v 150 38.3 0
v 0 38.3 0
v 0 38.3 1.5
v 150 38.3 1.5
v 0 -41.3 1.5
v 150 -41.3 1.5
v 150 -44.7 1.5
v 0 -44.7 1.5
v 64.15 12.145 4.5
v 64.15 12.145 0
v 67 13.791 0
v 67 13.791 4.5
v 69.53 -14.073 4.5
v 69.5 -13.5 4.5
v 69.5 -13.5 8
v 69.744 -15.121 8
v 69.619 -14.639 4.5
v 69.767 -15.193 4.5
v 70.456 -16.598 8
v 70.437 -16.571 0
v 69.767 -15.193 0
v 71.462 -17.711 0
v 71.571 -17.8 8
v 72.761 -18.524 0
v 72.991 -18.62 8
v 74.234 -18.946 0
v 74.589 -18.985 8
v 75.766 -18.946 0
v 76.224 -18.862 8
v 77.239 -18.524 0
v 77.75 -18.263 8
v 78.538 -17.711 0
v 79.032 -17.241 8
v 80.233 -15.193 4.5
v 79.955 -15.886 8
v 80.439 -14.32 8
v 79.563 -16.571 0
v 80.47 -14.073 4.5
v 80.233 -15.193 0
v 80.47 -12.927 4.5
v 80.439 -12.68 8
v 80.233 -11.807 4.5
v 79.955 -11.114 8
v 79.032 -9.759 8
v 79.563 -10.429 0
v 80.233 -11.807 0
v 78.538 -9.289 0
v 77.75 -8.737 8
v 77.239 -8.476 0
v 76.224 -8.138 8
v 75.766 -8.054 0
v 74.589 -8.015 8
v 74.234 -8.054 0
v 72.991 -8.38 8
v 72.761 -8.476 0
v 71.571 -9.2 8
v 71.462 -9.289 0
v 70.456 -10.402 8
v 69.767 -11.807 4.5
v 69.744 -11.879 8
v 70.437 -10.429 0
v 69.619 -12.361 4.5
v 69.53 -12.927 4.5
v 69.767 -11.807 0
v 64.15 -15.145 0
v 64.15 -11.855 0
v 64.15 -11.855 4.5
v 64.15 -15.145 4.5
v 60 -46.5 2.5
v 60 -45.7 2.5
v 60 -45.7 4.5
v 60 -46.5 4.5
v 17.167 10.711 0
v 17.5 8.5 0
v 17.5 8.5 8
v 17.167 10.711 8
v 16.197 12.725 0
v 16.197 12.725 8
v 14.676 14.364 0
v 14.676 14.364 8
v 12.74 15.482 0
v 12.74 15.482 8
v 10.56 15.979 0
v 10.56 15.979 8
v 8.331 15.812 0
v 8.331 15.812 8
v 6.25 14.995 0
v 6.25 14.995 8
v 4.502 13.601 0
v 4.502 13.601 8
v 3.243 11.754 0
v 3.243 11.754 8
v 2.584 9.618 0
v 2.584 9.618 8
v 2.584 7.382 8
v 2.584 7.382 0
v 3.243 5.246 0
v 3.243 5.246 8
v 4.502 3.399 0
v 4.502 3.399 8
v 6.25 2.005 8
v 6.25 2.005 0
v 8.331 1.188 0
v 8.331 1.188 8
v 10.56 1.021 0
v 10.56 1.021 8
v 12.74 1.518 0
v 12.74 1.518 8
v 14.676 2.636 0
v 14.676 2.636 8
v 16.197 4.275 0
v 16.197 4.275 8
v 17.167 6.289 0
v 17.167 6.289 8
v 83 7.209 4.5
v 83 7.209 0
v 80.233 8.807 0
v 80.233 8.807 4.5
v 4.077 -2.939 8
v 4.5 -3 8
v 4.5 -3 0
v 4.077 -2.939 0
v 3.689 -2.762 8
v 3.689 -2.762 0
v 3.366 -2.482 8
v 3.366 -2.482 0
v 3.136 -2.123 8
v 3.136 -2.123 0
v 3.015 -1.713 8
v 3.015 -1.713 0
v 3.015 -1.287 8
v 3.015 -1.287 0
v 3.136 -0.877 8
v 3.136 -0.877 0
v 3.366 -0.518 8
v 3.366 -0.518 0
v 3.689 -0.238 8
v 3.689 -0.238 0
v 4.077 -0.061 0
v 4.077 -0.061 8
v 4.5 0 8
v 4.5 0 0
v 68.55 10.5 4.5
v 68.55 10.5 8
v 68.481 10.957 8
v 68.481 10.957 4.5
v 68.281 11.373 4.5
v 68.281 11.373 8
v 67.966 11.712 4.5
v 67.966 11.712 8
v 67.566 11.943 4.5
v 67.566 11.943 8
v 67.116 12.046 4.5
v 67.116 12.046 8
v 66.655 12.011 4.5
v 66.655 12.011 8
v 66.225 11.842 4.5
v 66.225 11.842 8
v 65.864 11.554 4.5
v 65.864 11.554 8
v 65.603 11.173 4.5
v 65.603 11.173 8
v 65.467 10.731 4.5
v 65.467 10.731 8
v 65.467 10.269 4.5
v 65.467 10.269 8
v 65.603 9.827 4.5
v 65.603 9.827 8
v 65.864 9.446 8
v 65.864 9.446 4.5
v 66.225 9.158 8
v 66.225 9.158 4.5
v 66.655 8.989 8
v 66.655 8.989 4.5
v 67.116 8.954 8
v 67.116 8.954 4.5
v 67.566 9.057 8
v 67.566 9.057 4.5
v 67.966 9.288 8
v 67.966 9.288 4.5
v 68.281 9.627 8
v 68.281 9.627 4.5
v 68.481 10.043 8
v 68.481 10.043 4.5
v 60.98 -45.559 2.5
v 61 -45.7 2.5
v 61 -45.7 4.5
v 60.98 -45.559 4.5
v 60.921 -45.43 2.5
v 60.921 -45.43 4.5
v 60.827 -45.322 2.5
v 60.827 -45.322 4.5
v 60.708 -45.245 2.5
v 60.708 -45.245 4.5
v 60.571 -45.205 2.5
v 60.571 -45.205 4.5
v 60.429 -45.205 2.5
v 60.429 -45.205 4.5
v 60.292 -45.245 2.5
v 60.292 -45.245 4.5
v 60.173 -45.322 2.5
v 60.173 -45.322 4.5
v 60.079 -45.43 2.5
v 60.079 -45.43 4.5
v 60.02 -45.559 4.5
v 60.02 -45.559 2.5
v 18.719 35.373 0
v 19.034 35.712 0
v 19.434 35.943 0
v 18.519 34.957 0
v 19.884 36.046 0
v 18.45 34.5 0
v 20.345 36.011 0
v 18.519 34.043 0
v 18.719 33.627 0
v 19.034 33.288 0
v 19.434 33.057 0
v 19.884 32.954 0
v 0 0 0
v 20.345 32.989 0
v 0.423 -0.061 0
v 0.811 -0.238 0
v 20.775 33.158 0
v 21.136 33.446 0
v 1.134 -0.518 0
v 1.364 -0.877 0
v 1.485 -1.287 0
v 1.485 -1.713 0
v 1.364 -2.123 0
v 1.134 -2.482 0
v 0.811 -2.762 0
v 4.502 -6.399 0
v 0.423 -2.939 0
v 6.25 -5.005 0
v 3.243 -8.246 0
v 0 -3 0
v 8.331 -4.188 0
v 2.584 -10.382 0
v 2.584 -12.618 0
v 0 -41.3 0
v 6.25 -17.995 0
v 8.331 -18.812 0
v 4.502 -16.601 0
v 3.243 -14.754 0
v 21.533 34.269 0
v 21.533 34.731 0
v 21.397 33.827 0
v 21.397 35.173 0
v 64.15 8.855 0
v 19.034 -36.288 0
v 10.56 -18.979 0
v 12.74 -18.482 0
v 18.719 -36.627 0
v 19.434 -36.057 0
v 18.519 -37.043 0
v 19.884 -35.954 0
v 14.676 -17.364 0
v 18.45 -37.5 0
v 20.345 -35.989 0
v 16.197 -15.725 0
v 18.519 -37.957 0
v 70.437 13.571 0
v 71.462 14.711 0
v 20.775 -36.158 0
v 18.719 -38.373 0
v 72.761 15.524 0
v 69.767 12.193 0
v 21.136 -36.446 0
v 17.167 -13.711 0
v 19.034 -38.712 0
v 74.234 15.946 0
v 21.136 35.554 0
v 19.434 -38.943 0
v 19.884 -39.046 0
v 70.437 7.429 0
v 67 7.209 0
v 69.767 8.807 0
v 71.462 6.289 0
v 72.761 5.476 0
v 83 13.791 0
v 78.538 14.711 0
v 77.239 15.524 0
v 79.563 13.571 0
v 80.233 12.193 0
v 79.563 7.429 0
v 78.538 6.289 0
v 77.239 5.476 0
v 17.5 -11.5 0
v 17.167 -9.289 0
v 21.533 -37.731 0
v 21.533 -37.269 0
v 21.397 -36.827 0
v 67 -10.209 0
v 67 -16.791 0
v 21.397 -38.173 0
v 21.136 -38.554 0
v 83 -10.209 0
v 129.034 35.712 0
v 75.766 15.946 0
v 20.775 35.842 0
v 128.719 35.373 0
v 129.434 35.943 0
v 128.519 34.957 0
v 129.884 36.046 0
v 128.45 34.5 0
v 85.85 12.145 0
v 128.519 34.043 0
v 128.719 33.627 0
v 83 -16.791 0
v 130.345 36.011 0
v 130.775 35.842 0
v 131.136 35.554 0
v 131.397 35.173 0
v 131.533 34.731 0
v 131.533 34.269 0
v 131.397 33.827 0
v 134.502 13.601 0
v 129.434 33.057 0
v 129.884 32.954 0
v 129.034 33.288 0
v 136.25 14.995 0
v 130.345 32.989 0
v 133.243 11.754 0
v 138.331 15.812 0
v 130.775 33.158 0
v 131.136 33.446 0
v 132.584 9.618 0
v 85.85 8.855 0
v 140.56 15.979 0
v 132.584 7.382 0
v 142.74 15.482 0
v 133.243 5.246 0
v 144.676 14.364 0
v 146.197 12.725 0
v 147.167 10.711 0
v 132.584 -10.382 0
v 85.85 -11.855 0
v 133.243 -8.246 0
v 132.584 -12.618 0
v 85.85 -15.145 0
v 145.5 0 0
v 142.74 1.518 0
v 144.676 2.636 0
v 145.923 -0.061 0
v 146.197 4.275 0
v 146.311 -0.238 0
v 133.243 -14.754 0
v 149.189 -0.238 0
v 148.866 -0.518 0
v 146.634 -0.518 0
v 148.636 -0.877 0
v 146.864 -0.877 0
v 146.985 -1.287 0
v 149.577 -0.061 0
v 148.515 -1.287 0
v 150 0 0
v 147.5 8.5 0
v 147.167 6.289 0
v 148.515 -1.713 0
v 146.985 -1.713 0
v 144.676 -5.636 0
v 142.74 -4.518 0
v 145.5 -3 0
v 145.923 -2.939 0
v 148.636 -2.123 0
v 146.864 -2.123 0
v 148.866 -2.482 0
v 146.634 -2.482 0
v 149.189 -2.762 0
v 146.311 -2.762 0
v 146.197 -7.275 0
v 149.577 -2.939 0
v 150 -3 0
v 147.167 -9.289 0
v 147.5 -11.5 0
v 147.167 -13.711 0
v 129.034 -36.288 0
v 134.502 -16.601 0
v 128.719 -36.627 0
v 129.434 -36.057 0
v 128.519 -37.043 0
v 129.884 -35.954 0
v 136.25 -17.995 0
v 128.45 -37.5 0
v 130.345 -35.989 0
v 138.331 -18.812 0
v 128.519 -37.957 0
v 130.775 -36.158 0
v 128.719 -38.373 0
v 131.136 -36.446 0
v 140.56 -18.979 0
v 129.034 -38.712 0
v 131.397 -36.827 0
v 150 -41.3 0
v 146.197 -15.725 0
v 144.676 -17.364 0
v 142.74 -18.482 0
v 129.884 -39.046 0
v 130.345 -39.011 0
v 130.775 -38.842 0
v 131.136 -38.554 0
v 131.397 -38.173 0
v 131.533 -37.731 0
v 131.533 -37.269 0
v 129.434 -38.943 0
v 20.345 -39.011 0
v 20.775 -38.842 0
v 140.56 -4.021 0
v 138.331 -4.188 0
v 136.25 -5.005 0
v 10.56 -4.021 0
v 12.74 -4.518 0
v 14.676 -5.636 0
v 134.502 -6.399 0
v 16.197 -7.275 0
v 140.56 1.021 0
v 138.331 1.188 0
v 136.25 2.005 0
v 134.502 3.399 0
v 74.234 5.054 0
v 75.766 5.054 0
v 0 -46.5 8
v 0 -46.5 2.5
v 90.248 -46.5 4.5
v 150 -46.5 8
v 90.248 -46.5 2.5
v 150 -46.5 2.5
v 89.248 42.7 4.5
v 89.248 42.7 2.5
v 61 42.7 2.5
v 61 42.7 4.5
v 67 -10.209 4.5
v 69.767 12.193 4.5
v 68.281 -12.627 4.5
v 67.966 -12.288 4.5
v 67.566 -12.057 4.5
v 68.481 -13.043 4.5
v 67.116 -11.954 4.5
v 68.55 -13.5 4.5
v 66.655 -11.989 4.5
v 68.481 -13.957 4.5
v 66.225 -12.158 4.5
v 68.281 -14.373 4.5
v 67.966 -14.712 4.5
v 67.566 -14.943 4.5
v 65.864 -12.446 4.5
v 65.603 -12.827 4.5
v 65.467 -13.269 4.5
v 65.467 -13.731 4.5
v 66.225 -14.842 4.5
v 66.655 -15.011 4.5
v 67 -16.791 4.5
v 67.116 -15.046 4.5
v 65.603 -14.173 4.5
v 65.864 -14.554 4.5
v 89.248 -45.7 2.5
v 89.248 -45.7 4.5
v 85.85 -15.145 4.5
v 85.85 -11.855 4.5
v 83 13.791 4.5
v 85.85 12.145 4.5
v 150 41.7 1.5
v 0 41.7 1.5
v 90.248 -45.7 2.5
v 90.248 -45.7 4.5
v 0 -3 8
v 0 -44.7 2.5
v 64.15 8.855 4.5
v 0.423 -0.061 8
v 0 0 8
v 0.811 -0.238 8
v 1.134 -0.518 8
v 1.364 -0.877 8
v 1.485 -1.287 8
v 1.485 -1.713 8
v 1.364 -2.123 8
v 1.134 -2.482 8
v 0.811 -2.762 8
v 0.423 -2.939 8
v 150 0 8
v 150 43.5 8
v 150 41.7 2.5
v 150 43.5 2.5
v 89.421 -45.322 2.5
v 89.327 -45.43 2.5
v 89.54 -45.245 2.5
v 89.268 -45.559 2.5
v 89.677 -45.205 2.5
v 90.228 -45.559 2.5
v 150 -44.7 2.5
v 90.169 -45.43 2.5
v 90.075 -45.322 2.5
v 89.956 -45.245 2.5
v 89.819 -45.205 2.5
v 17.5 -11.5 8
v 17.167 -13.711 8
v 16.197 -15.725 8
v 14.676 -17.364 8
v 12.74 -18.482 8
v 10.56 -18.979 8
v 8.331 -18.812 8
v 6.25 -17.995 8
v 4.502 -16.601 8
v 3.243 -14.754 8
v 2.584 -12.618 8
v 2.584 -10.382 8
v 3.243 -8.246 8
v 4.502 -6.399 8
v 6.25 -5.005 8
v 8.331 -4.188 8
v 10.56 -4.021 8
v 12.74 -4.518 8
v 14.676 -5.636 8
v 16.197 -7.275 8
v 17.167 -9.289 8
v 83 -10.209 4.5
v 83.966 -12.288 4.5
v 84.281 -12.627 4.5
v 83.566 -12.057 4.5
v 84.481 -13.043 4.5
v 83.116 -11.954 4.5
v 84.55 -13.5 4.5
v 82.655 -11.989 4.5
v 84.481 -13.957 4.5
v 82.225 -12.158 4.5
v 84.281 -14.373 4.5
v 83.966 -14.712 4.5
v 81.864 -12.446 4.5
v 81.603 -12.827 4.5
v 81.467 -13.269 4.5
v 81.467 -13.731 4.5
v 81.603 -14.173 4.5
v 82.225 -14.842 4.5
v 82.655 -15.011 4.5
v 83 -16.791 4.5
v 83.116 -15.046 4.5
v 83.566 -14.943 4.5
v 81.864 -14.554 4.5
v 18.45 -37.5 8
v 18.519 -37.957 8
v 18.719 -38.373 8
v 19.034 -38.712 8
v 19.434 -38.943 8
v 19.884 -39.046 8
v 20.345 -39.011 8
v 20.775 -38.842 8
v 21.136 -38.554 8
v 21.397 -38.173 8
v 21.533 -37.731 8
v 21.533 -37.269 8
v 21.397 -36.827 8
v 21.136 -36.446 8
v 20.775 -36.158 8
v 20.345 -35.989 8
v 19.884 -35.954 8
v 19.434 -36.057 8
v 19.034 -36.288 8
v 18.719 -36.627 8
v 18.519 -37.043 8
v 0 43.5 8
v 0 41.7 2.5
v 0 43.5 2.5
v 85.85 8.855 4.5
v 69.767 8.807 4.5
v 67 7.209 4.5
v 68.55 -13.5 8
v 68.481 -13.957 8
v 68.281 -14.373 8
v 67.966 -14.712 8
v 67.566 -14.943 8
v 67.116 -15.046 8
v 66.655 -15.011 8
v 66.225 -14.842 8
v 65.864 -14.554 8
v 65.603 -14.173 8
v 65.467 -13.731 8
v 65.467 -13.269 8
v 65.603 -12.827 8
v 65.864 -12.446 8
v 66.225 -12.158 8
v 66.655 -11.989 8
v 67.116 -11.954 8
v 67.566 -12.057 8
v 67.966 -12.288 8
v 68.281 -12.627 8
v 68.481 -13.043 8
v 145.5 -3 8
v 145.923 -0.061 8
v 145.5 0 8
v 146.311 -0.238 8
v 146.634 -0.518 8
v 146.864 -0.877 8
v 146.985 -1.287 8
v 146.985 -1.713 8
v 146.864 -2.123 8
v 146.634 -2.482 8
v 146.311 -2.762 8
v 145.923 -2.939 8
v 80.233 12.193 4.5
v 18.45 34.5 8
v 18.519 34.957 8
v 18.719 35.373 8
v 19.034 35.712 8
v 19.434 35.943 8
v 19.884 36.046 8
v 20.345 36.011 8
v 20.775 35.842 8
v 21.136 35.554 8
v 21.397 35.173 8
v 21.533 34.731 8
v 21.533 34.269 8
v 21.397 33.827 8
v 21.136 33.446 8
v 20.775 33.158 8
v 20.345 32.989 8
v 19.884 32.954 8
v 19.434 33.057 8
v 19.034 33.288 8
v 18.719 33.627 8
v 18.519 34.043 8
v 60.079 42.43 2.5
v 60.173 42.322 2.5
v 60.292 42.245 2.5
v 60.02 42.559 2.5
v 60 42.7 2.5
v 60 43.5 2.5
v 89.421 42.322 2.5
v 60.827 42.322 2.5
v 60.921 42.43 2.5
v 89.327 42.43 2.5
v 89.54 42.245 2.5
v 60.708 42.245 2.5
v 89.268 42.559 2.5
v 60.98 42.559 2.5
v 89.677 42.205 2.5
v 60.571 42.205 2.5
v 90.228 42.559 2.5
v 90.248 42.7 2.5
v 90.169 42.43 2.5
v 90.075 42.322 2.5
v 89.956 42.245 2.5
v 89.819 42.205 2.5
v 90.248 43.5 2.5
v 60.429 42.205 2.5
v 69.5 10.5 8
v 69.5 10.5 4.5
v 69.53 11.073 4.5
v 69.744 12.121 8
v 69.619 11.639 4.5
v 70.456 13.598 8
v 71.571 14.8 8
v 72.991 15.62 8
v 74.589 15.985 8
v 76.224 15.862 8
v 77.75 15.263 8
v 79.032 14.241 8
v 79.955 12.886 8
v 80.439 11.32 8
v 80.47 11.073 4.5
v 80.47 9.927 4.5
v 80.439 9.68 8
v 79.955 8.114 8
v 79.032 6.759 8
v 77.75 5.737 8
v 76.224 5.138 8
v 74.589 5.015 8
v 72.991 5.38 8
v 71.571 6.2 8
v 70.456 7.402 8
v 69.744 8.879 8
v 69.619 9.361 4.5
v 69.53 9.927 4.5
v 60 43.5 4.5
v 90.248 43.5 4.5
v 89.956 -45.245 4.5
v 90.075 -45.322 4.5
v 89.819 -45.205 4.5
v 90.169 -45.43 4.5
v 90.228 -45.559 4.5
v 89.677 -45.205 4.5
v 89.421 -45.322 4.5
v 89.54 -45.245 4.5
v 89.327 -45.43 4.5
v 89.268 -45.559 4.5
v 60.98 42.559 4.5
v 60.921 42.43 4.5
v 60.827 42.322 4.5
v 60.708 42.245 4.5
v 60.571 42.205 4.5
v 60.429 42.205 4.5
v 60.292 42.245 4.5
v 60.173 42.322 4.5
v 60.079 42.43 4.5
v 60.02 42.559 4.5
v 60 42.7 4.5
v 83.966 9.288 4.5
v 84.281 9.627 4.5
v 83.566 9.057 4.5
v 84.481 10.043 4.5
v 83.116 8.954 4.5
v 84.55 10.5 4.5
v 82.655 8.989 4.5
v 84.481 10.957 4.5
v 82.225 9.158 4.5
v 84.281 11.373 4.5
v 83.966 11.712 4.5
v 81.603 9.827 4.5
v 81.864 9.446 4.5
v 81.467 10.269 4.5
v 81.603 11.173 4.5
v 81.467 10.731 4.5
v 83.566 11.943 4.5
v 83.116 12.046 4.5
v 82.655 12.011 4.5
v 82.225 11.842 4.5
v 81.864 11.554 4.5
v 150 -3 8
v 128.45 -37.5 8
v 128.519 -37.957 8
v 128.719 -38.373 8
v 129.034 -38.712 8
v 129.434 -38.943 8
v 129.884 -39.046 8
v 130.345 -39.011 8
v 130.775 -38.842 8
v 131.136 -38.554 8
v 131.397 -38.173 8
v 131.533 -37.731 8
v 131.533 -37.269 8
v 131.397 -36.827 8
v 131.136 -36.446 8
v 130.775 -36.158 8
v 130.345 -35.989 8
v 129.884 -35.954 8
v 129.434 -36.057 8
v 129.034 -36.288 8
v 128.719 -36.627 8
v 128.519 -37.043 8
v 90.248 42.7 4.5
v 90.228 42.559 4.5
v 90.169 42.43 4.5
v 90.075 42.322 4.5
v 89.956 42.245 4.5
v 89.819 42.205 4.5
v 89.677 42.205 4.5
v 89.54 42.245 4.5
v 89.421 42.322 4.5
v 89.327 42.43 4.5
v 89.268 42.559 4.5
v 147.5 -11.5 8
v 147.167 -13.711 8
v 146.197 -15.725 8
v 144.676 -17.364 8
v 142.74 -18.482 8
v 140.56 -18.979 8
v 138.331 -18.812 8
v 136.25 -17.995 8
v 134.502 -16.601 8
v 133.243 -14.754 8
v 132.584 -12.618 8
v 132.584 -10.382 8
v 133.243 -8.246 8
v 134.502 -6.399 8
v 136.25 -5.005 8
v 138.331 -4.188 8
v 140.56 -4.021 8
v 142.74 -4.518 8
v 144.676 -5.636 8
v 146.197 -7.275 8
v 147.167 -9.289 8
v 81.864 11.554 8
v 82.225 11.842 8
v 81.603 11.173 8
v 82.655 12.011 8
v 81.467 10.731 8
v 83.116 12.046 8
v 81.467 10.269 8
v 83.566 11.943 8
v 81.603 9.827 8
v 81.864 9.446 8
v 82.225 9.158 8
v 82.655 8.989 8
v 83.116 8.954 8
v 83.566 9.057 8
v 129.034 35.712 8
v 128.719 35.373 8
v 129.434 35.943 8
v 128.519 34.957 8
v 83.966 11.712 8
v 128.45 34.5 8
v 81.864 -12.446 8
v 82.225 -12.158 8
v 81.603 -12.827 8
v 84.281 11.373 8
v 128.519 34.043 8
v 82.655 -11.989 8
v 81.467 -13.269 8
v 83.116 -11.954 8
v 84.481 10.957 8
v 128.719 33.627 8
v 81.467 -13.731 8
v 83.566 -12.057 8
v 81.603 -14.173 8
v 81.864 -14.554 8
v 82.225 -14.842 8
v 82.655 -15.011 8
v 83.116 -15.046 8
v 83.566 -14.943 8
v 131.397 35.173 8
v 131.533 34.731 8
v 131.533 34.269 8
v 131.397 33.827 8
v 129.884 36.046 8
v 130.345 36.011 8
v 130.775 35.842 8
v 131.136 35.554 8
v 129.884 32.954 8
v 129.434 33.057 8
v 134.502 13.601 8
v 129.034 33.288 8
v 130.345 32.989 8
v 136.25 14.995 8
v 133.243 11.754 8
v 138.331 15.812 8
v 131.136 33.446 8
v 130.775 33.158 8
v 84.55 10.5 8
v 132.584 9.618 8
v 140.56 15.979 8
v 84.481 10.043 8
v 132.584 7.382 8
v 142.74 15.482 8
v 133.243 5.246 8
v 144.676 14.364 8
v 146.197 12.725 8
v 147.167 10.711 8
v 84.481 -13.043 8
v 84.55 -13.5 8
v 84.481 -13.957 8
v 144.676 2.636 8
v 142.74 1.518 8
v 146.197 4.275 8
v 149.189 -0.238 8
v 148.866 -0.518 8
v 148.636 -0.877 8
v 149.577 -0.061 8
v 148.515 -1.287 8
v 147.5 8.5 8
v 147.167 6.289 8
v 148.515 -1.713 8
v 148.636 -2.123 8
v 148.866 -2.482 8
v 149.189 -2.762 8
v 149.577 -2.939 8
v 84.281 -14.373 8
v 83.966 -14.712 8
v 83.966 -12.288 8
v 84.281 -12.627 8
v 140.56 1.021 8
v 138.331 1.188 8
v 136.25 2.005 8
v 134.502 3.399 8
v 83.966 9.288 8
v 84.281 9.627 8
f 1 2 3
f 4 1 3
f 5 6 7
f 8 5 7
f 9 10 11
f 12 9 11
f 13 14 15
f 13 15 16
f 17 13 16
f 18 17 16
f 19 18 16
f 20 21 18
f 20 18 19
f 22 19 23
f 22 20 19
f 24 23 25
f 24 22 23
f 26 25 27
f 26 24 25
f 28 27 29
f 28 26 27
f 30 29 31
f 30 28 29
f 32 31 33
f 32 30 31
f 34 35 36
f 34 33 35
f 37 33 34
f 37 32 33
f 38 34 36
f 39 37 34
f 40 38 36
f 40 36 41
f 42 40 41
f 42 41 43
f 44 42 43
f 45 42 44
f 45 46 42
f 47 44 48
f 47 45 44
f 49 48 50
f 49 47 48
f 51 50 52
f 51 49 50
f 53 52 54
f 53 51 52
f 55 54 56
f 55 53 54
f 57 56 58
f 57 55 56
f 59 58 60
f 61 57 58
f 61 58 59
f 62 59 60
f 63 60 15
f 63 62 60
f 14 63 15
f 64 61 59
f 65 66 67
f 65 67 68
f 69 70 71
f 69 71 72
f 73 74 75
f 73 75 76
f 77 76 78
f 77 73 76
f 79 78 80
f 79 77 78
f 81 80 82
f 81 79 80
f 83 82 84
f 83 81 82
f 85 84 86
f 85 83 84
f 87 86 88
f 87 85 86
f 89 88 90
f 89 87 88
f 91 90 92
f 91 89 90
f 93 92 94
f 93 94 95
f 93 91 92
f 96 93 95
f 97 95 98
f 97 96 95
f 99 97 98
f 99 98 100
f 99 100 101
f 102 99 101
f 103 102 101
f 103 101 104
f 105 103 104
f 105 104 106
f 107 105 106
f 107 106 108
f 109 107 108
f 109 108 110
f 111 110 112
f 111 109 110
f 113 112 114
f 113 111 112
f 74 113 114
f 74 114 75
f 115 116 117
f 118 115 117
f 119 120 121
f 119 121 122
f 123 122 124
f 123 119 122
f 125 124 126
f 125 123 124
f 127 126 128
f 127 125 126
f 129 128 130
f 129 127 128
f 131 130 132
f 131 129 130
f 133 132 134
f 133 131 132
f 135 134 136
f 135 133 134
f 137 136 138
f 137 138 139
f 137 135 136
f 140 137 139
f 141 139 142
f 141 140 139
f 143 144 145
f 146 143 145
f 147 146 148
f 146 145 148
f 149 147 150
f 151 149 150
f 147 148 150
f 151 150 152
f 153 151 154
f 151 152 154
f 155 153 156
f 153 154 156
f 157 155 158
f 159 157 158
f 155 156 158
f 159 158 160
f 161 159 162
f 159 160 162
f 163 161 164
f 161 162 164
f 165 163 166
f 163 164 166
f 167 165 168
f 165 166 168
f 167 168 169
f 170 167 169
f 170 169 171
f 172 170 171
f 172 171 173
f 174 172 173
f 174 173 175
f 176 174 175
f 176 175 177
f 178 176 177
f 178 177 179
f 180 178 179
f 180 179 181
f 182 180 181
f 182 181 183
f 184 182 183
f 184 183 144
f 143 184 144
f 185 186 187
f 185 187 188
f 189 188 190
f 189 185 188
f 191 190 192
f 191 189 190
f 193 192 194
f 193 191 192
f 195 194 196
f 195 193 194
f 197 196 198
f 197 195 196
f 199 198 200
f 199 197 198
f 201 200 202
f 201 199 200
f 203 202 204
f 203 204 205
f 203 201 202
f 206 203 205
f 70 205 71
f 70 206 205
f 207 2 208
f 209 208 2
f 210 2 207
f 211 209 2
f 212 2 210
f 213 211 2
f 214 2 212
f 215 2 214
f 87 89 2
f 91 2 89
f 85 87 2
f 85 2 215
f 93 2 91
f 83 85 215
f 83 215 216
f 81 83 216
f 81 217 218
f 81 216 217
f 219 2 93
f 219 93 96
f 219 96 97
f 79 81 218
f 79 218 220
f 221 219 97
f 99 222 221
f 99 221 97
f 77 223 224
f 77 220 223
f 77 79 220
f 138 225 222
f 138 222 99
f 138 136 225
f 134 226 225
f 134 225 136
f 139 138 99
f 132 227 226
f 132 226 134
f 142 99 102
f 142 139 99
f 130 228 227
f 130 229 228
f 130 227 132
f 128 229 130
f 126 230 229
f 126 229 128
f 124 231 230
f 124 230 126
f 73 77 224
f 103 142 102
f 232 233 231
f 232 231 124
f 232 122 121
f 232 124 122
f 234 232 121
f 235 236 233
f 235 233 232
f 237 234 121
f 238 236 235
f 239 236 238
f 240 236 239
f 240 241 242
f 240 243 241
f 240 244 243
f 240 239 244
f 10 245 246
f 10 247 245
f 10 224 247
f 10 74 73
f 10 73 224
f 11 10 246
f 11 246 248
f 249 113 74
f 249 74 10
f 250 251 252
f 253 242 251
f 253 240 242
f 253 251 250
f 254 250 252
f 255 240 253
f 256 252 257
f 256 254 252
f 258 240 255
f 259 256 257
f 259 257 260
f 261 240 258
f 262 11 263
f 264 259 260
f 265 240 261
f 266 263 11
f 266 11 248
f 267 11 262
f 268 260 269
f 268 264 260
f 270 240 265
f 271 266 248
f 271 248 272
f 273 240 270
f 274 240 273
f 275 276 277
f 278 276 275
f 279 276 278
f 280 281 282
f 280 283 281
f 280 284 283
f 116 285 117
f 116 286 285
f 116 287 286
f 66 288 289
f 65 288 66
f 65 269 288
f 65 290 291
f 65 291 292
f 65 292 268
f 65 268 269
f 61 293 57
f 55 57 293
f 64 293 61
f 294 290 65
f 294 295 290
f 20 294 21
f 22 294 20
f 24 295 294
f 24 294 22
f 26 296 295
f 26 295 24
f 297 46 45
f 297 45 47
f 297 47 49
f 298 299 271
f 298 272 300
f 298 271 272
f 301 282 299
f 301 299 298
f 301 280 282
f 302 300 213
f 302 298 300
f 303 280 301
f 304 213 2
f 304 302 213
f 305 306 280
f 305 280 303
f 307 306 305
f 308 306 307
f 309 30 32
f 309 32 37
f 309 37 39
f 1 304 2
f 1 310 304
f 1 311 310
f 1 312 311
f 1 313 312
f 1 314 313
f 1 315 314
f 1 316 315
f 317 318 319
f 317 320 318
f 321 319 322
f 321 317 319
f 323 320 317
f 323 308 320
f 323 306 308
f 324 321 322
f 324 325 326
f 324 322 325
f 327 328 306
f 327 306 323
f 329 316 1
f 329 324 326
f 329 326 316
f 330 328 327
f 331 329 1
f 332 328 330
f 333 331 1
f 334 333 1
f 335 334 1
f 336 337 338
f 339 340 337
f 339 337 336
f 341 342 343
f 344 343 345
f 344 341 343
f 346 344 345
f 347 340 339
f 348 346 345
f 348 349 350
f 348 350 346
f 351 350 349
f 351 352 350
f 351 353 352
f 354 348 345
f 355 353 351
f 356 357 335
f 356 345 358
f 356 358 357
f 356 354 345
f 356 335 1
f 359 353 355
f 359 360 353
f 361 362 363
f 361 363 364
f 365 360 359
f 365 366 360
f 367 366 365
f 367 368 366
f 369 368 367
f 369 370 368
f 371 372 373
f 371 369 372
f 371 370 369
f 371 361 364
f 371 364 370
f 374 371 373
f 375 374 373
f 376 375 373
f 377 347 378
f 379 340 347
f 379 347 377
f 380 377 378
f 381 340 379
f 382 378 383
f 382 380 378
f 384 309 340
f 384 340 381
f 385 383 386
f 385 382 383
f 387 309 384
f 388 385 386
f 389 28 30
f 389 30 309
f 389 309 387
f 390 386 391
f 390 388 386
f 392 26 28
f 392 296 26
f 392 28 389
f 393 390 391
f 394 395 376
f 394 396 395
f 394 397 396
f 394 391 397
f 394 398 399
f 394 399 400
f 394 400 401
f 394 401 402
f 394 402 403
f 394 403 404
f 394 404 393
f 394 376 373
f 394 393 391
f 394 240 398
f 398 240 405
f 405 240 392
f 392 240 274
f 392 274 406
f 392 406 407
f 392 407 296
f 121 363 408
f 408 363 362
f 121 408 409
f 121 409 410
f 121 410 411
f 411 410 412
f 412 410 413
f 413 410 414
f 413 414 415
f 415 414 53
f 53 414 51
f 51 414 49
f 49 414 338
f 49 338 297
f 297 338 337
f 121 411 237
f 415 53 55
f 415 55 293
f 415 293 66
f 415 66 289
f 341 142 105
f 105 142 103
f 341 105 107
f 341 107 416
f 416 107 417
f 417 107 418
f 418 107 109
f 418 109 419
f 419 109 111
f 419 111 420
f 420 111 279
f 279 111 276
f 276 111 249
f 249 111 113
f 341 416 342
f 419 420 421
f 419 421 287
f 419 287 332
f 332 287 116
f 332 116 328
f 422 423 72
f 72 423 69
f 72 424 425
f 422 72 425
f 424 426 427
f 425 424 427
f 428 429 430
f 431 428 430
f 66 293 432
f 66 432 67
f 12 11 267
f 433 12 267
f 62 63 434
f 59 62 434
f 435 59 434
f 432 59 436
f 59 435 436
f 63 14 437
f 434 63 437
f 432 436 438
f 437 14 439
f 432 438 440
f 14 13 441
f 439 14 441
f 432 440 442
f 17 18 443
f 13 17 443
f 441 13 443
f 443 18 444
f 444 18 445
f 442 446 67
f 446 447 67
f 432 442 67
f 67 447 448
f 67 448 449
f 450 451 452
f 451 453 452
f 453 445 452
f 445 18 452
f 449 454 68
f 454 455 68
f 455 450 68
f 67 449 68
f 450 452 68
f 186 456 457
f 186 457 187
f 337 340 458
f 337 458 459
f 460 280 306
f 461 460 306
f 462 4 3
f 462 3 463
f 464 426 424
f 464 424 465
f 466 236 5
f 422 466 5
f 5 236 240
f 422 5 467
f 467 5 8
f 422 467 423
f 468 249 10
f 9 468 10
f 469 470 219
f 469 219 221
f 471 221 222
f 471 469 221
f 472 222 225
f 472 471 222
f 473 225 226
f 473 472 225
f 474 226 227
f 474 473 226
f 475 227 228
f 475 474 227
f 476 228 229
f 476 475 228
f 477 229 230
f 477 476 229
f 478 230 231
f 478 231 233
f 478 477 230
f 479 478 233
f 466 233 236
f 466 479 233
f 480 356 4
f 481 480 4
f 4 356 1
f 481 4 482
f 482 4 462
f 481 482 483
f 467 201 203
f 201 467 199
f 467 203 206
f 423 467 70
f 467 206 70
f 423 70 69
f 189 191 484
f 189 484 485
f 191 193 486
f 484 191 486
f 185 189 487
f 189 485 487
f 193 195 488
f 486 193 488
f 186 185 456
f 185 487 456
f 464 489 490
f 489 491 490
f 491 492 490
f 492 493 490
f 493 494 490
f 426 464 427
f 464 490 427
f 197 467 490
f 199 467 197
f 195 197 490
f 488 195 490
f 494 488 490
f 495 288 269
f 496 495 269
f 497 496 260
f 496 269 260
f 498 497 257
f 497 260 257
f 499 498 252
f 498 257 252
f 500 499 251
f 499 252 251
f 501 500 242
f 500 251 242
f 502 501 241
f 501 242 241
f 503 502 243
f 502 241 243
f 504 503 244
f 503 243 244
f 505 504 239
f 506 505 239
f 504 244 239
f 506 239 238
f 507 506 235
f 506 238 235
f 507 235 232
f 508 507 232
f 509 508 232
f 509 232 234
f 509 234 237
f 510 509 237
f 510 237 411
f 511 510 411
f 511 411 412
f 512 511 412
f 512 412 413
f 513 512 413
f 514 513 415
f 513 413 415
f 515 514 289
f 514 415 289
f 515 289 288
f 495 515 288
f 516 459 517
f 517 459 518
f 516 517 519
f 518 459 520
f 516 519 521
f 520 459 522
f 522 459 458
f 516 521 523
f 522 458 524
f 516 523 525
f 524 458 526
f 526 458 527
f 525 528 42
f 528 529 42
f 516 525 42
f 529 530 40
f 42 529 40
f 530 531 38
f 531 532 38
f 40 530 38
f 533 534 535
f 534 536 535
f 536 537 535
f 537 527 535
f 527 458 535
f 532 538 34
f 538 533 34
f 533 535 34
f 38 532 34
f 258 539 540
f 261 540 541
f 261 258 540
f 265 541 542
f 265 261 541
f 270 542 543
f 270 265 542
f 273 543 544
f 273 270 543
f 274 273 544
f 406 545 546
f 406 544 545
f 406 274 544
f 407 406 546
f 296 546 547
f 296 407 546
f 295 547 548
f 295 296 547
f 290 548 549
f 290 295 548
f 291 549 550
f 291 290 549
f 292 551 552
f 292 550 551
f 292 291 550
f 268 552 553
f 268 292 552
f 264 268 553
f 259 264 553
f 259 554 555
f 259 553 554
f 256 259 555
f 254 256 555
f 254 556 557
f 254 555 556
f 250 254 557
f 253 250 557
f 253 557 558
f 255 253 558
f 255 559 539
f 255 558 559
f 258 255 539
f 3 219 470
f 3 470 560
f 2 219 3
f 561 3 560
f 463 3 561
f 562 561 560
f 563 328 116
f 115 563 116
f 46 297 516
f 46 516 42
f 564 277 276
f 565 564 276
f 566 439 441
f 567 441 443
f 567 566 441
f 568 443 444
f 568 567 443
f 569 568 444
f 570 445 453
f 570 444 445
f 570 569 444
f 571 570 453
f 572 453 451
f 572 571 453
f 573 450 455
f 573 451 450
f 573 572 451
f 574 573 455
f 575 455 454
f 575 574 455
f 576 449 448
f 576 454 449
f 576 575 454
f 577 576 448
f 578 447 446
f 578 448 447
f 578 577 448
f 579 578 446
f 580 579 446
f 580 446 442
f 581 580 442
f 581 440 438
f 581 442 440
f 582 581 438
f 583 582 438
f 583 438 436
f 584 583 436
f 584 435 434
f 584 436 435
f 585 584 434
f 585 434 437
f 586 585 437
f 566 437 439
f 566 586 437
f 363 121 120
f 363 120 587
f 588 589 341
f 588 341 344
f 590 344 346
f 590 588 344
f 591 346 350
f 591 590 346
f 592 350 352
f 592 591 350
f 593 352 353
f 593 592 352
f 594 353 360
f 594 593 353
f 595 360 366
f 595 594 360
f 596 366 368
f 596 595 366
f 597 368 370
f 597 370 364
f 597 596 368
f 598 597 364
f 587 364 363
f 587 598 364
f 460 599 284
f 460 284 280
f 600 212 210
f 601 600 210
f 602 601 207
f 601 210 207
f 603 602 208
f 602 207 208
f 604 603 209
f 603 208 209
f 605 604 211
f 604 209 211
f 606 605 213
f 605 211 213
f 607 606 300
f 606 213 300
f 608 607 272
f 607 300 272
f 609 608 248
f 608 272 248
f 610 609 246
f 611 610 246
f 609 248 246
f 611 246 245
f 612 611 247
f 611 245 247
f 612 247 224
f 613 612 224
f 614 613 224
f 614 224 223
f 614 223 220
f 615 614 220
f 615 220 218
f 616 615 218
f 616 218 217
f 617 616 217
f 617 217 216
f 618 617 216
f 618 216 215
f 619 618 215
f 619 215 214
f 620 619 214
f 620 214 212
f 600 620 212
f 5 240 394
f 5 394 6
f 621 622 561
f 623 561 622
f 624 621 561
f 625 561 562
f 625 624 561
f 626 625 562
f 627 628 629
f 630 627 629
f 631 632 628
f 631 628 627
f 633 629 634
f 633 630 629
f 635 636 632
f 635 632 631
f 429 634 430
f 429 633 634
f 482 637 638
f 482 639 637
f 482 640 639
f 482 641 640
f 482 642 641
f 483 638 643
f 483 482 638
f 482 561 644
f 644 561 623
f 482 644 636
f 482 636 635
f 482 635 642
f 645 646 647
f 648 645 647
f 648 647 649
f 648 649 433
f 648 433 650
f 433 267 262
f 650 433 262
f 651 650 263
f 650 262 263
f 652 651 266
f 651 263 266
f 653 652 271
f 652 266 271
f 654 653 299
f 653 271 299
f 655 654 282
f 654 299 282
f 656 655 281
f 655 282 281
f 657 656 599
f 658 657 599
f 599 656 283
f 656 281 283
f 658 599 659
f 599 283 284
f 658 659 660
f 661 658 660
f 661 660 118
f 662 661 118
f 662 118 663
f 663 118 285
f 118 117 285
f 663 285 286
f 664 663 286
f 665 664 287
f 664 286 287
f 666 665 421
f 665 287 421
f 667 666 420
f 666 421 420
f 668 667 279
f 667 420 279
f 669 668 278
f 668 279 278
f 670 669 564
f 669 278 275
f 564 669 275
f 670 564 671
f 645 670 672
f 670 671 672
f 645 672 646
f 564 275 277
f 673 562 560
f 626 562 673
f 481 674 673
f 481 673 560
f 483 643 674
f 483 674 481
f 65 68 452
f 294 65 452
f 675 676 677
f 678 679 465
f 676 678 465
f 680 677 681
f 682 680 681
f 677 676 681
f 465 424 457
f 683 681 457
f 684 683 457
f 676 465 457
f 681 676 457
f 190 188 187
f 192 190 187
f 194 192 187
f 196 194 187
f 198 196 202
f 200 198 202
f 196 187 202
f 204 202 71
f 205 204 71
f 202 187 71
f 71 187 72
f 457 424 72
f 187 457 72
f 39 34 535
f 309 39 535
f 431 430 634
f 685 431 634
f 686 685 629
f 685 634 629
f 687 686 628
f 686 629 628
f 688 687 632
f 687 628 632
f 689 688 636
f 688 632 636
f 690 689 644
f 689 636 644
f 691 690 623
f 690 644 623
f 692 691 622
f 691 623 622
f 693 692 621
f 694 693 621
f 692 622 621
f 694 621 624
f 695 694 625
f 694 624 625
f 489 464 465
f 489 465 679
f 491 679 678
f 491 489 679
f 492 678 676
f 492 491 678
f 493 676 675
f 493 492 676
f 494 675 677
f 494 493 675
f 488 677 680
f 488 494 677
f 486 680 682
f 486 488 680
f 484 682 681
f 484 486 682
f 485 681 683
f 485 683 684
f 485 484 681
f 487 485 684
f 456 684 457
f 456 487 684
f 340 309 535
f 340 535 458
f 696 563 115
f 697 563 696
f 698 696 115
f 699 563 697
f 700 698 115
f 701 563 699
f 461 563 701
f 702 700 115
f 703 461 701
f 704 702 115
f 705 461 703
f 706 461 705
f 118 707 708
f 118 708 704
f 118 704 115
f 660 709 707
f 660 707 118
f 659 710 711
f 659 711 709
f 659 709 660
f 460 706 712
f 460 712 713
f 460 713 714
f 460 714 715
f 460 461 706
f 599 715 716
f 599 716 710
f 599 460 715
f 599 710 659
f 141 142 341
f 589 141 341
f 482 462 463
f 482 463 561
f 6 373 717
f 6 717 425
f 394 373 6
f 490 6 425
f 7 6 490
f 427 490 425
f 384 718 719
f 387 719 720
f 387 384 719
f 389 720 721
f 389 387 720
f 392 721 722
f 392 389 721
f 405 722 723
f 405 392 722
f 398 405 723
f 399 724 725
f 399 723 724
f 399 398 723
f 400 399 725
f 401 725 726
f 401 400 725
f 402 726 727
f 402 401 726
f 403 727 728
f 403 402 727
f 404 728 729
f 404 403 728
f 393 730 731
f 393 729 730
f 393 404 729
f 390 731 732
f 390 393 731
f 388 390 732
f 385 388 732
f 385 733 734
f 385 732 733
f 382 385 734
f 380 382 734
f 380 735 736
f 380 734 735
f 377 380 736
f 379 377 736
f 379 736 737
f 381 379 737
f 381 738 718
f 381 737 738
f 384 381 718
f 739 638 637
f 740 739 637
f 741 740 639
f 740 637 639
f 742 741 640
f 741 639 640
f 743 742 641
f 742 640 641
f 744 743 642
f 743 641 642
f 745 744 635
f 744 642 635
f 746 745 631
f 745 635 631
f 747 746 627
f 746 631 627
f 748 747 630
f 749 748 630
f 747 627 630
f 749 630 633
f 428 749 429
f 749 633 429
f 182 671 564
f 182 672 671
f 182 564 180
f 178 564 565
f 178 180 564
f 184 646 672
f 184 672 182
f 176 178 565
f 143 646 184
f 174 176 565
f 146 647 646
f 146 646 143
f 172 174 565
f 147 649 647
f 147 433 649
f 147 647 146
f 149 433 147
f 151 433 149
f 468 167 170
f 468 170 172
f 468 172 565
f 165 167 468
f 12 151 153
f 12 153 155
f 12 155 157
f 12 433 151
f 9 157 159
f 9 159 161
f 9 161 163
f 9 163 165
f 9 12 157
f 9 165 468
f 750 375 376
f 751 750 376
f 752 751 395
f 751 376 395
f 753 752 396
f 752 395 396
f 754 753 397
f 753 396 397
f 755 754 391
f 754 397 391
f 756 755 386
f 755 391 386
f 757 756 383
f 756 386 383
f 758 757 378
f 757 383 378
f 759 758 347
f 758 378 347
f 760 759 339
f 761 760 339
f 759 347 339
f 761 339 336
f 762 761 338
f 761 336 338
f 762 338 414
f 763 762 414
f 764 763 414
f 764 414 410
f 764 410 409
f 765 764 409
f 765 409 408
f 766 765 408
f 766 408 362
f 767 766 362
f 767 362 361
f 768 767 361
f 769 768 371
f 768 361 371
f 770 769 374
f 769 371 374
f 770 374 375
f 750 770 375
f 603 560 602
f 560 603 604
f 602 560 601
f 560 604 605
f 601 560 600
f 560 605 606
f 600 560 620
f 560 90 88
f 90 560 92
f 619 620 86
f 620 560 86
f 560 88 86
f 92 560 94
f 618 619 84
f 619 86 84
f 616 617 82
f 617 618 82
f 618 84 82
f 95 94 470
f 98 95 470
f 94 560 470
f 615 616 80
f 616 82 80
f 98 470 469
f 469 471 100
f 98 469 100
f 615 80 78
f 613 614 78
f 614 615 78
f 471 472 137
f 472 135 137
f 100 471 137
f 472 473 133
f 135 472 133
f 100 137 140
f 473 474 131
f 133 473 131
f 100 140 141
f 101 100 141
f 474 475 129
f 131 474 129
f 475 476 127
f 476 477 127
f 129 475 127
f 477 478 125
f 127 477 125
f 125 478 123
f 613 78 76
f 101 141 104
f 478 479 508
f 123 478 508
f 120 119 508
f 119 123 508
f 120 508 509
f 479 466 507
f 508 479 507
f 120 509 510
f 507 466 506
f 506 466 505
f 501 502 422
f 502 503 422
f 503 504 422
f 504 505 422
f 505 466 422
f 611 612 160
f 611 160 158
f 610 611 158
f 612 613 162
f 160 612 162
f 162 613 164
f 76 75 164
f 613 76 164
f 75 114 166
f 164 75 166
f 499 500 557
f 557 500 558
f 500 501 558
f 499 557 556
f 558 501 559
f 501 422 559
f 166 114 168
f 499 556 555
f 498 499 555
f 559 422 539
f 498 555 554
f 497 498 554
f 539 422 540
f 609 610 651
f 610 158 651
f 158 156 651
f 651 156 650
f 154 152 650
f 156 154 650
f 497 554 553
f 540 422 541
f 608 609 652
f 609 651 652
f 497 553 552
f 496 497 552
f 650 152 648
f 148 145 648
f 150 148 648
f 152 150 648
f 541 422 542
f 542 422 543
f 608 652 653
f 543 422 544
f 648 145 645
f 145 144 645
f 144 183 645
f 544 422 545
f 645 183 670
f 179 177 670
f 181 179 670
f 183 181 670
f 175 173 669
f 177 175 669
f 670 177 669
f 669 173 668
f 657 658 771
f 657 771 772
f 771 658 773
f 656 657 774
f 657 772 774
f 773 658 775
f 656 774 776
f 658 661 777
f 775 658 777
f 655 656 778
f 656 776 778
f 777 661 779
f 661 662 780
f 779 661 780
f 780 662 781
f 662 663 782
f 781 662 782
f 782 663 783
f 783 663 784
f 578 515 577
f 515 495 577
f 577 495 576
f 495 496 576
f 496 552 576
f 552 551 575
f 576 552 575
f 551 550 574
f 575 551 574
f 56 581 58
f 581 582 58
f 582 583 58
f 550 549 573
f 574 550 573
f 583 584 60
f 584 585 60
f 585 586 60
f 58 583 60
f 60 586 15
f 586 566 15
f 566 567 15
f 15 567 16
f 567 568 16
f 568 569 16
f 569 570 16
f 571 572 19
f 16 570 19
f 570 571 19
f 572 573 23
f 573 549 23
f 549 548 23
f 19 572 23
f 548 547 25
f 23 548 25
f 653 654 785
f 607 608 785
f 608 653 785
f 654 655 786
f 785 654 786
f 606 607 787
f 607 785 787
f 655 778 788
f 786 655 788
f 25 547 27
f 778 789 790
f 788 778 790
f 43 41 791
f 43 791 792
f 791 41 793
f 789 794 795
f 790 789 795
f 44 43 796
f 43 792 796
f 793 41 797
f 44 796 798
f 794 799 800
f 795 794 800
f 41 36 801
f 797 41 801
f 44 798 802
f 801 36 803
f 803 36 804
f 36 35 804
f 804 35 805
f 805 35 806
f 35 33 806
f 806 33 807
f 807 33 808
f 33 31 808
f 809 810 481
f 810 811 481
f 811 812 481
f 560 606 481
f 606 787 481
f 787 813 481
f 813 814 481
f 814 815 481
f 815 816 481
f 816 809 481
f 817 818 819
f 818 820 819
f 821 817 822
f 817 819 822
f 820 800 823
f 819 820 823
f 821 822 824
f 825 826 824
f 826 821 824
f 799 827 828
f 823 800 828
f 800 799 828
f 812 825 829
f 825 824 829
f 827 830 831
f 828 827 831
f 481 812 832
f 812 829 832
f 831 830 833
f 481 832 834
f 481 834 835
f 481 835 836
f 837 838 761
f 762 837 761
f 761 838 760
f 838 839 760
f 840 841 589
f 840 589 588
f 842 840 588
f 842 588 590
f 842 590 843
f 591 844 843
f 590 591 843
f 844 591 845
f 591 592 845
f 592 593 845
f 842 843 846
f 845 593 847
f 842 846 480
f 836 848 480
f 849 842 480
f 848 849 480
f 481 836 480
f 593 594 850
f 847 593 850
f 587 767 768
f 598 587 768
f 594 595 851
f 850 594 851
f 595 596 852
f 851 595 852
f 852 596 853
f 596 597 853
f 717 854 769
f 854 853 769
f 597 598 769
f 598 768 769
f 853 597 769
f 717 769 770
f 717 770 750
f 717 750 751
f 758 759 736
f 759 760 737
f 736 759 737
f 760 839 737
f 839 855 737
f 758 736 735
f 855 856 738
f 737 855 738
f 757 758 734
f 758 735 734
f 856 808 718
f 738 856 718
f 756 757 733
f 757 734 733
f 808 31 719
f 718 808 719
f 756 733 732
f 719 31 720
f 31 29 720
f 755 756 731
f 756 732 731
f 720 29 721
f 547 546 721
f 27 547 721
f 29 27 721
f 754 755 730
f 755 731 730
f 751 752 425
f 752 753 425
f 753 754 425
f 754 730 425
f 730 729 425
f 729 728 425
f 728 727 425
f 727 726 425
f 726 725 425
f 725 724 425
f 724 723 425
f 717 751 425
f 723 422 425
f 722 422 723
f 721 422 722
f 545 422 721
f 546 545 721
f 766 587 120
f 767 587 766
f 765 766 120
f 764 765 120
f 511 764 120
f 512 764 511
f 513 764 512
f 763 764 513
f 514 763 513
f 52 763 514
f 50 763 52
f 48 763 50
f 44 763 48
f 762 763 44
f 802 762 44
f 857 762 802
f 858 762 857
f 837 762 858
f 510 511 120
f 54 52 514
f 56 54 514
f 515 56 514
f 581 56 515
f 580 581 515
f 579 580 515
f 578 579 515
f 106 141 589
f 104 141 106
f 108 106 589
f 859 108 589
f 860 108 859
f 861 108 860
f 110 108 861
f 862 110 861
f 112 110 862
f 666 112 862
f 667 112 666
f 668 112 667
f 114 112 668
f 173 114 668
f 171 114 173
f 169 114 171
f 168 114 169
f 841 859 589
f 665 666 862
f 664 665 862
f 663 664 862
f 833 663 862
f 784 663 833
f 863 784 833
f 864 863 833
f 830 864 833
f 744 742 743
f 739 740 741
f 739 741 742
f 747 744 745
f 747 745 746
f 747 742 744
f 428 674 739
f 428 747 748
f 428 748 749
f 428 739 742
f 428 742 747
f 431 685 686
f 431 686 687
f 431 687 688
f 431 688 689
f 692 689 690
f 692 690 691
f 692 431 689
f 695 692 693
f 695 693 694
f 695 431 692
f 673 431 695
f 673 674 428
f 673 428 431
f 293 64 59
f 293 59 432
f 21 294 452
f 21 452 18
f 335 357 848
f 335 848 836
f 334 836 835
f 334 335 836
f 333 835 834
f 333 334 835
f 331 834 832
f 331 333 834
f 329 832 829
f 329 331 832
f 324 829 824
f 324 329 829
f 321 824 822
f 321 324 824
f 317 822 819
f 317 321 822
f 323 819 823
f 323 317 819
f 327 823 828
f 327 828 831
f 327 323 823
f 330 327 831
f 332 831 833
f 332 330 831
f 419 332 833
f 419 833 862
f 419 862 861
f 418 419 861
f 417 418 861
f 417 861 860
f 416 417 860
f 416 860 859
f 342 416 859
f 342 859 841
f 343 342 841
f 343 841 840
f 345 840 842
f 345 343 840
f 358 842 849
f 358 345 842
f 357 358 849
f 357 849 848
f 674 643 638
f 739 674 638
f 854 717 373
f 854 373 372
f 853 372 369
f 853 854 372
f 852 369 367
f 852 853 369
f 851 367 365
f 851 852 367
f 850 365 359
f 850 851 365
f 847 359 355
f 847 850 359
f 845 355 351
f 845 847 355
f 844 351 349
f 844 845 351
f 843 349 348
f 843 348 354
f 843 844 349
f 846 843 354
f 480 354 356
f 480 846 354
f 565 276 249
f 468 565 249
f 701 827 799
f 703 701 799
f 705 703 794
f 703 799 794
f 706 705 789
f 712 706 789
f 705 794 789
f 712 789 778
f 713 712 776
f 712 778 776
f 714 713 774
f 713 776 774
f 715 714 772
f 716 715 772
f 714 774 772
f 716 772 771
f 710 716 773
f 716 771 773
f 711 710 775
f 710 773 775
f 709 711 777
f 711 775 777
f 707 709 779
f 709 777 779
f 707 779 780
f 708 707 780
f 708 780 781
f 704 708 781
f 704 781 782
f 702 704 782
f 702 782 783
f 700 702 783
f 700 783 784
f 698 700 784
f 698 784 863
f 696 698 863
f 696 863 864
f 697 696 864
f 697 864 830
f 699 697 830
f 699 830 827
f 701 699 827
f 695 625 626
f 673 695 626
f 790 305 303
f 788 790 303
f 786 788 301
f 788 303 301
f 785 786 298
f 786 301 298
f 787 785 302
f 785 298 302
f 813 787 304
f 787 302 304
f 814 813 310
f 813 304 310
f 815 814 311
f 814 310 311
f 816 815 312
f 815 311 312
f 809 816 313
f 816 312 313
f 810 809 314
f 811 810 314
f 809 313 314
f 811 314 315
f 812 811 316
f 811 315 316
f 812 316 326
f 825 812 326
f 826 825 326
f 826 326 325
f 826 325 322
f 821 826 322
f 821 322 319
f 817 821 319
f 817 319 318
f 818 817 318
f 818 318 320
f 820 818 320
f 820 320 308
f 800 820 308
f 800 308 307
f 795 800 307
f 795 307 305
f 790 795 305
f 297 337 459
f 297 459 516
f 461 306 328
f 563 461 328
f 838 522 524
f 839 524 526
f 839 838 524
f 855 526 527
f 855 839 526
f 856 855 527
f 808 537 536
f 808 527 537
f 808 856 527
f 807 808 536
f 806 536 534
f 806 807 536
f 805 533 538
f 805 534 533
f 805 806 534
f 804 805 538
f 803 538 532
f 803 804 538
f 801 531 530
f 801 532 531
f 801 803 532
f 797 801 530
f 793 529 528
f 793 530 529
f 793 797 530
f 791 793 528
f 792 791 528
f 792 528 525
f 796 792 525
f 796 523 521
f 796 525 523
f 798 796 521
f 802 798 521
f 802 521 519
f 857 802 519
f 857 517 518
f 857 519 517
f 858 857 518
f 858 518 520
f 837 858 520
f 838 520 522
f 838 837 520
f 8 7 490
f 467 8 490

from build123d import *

# Parameters (mm, degrees)
SKETCH_2_W           = 150
SKETCH_2_H           = 43.5
SKETCH_2_R           = 7.5
SKETCH_2_R_2         = 4.05
EXTRUDE_1_DEPTH      = 8
CUT_EXTRUDE_2_DEPTH  = 157.38494173
SKETCH_5_R           = 1.55
CUT_EXTRUDE_3_DEPTH  = 157.38494173
SKETCH_20_R          = 5.5
CUT_EXTRUDE_17_DEPTH = 157.38494173
CUT_EXTRUDE_5_DEPTH  = 4.5
SKETCH_25_R          = 1.55
CUT_EXTRUDE_13_DEPTH = 157.38494173
CUT_EXTRUDE_11_DEPTH = 2
EXTRUDE_2_DEPTH      = 8


with BuildPart() as part:
    # 草图2 → 凸台-拉伸1 (new body)
    with BuildSketch(Plane.XY):
        with Locations((75, 21.75)):
            Rectangle(SKETCH_2_W, SKETCH_2_H)
        with Locations((10, 8.5)):
            Circle(SKETCH_2_R, mode=Mode.SUBTRACT)
        with Locations((75, 10.5)):
            Circle(SKETCH_2_R_2, mode=Mode.SUBTRACT)
        with Locations((140, 8.5)):
            Circle(SKETCH_2_R, mode=Mode.SUBTRACT)
    extrude_1 = extrude(amount=EXTRUDE_1_DEPTH)

    # 草图4 → 切除-拉伸2 (cut, through all)
    with BuildSketch(Plane(origin=(150, 0, 0), x_dir=(0, 0, -1), z_dir=(1, 0, 0))):
        Polygon((-1.5, 41.7), (-2.5, 41.7), (-2.5, 43.5), (0, 43.5), (0, 38.3), (-1.5, 38.3), align=None)
    cut_extrude_2 = extrude(amount=-CUT_EXTRUDE_2_DEPTH, mode=Mode.SUBTRACT)

    # 草图5 → 切除-拉伸3 (cut, through all)
    with BuildSketch(Plane.XY.offset(8)):
        with Locations((83, 10.5)):
            Circle(SKETCH_5_R)
        with Locations((67, 10.5)):
            Circle(SKETCH_5_R)
    cut_extrude_3 = extrude(amount=-CUT_EXTRUDE_3_DEPTH, mode=Mode.SUBTRACT)

    # 草图20 → 切除-拉伸17 (cut, through all)
    with BuildSketch(Plane(origin=(0, 0, 0), x_dir=(-1, 0, 0), z_dir=(0, 0, -1))):
        with Locations((-75, 10.5)):
            Circle(SKETCH_20_R)
    cut_extrude_17 = extrude(amount=-CUT_EXTRUDE_17_DEPTH, mode=Mode.SUBTRACT)

    # 草图8 → 切除-拉伸5 (cut)
    with BuildSketch(Plane(origin=(0, 0, 0), x_dir=(-1, 0, 0), z_dir=(0, 0, -1))):
        Polygon((-80.15, 8.854551733), (-80.15, 12.145448267), (-83, 13.790896534), (-85.85, 12.145448267), (-85.85, 8.854551733), (-83, 7.209103466), align=None)
        Polygon((-64.15, 8.854551733), (-64.15, 12.145448267), (-67, 13.790896534), (-69.85, 12.145448267), (-69.85, 8.854551733), (-67, 7.209103466), align=None)
    cut_extrude_5 = extrude(amount=-CUT_EXTRUDE_5_DEPTH, mode=Mode.SUBTRACT)

    # 草图25 → 切除-拉伸13 (cut, through all)
    with BuildSketch(Plane(origin=(0, 0, 0), x_dir=(-1, 0, 0), z_dir=(0, 0, -1))):
        with Locations((-130, 34.5)):
            Circle(SKETCH_25_R)
        with Locations((-20, 34.5)):
            Circle(SKETCH_25_R)
    cut_extrude_13 = extrude(amount=-CUT_EXTRUDE_13_DEPTH, mode=Mode.SUBTRACT)

    # 草图19 → 切除-拉伸11 (cut)
    with BuildSketch(Plane(origin=(0, 0, 2.5), x_dir=(-1, 0, 0), z_dir=(0, 0, -1))):
        with BuildLine():
            Line((-60, 43.5), (-90.247938178, 43.5))
            Line((-90.247938178, 43.5), (-90.247938178, 42.7))
            ThreePointArc((-90.247938178, 42.7), (-89.747938178, 42.2), (-89.247938178, 42.7))
            Line((-89.247938178, 42.7), (-61, 42.7))
            ThreePointArc((-61, 42.7), (-60.5, 42.2), (-60, 42.7))
            Line((-60, 42.7), (-60, 43.5))
        make_face()
    cut_extrude_11 = extrude(amount=-CUT_EXTRUDE_11_DEPTH, mode=Mode.SUBTRACT)

    # 草图22 → 凸台-拉伸2 (add)
    with BuildSketch(Plane.XY.offset(8)):
        with BuildLine():
            Line((0, -3), (4.5, -3))
            ThreePointArc((4.5, -3), (3, -1.5), (4.5, 0))
            Line((4.5, 0), (0, 0))
            ThreePointArc((0, 0), (1.5, -1.5), (0, -3))
        make_face()
        with BuildLine():
            Line((150, 0), (145.5, 0))
            ThreePointArc((145.5, 0), (147, -1.5), (145.5, -3))
            Line((145.5, -3), (150, -3))
            ThreePointArc((150, -3), (148.5, -1.5), (150, 0))
        make_face()
    extrude(amount=-EXTRUDE_2_DEPTH)

    # 镜向2: 凸台-拉伸1, 切除-拉伸2, 切除-拉伸3, 切除-拉伸17, 切除-拉伸5, 切除-拉伸13, 切除-拉伸11 across plane
    add(extrude_1.mirror(Plane(origin=(0, -1.5, 0), x_dir=(0, 0, 1), z_dir=(0, -1, 0))))
    add(cut_extrude_2.mirror(Plane(origin=(0, -1.5, 0), x_dir=(0, 0, 1), z_dir=(0, -1, 0))), mode=Mode.SUBTRACT)
    add(cut_extrude_3.mirror(Plane(origin=(0, -1.5, 0), x_dir=(0, 0, 1), z_dir=(0, -1, 0))), mode=Mode.SUBTRACT)
    add(cut_extrude_17.mirror(Plane(origin=(0, -1.5, 0), x_dir=(0, 0, 1), z_dir=(0, -1, 0))), mode=Mode.SUBTRACT)
    add(cut_extrude_5.mirror(Plane(origin=(0, -1.5, 0), x_dir=(0, 0, 1), z_dir=(0, -1, 0))), mode=Mode.SUBTRACT)
    add(cut_extrude_13.mirror(Plane(origin=(0, -1.5, 0), x_dir=(0, 0, 1), z_dir=(0, -1, 0))), mode=Mode.SUBTRACT)
    add(cut_extrude_11.mirror(Plane(origin=(0, -1.5, 0), x_dir=(0, 0, 1), z_dir=(0, -1, 0))), mode=Mode.SUBTRACT)


solid = part.part
